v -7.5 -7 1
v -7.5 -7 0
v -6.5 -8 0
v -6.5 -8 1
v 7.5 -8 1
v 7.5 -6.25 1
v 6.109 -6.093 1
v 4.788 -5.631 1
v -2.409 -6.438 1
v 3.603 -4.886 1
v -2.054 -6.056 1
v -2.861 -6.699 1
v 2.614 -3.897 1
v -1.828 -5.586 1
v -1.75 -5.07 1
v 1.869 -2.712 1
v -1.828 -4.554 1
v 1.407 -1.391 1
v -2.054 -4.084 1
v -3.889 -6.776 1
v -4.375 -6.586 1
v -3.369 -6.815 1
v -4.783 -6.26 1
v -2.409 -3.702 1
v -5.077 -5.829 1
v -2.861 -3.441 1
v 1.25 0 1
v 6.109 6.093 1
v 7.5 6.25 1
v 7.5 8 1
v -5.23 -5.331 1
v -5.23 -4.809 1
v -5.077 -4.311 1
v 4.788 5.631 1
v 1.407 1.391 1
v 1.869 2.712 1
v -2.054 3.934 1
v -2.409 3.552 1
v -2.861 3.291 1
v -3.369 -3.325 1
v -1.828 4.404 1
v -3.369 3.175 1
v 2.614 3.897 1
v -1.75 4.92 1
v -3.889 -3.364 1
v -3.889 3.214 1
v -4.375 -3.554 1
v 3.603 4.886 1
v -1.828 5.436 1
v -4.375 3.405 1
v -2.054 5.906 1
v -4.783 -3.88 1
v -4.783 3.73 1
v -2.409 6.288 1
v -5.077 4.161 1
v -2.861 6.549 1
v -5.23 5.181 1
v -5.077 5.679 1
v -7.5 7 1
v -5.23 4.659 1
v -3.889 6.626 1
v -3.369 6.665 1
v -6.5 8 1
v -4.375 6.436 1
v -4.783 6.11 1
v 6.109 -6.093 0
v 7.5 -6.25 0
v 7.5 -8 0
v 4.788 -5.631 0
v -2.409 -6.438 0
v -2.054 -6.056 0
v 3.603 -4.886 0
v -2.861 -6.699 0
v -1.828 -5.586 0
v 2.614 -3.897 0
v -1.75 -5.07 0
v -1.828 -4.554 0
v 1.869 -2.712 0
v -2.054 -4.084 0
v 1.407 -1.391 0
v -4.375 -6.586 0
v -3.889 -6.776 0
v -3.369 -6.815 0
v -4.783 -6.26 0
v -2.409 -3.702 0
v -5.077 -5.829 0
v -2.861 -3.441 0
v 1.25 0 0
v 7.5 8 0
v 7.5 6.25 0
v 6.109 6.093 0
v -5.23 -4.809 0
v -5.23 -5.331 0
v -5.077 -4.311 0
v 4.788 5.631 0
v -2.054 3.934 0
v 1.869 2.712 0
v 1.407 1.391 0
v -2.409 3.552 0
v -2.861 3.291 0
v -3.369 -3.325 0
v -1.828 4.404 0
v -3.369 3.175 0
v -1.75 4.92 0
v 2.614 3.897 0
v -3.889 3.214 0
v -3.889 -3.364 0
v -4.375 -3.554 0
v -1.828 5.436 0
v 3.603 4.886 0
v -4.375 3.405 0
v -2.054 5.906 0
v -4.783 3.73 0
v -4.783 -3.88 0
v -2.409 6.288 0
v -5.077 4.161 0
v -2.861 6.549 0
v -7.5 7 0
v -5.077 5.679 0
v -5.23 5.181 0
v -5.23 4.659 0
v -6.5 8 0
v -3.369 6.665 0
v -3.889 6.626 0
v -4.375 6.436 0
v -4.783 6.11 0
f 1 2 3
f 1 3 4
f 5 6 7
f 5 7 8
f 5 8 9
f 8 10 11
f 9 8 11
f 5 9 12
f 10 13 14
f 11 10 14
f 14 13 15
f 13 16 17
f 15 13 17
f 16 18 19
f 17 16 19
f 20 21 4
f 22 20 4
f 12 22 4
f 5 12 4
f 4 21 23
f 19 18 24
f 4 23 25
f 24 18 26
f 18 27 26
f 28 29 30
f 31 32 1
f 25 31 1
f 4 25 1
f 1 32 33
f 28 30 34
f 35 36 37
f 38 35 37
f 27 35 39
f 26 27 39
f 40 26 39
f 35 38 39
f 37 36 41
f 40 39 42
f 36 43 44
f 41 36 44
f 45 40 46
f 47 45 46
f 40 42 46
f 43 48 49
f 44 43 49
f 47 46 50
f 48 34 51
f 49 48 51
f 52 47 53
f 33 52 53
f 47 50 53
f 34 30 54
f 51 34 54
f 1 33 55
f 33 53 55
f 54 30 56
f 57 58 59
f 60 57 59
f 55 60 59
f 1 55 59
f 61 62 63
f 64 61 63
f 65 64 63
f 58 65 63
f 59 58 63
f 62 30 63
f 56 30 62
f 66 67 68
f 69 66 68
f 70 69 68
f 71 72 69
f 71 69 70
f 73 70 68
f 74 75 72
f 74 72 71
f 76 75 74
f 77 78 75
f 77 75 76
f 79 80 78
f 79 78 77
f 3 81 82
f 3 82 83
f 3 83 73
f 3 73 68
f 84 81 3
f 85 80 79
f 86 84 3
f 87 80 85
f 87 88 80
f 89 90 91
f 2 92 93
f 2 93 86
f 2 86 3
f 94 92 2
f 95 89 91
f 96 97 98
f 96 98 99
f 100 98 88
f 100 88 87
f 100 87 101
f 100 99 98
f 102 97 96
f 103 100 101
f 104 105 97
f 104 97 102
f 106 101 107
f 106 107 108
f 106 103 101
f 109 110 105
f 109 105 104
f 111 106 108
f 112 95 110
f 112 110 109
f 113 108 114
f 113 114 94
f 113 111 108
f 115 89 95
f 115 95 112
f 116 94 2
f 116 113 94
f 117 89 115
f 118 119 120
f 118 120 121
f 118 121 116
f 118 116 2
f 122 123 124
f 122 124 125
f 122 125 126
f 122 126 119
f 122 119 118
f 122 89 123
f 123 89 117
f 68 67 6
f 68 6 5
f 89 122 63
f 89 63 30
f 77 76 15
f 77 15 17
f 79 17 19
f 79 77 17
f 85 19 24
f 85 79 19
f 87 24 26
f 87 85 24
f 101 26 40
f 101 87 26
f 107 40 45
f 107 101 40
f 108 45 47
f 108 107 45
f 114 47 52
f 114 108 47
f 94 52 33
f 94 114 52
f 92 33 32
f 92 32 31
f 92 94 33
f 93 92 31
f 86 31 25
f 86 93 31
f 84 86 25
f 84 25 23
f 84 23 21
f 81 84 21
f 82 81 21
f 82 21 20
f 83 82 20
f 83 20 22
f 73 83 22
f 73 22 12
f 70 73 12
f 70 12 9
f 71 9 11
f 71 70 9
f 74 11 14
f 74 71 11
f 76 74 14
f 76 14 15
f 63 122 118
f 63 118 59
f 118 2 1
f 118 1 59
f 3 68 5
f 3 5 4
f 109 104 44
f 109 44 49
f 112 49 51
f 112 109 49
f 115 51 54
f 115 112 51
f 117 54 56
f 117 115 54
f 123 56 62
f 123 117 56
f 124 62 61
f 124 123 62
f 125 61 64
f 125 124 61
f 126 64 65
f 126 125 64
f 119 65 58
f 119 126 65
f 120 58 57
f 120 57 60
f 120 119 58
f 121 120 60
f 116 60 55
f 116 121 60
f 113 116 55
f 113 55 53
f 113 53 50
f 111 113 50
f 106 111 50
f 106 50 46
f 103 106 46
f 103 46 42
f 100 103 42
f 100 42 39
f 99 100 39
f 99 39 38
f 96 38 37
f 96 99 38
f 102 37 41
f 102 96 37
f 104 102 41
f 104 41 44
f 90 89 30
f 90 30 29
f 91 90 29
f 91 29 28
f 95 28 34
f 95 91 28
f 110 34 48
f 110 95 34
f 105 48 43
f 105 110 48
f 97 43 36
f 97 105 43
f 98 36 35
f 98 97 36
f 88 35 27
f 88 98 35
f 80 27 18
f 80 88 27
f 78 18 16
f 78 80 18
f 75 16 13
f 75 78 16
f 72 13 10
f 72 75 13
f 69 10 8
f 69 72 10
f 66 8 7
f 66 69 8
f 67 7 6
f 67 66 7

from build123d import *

# Parameters (mm, degrees)
SKETCH1_R           = 1.75
BOSS_EXTRUDE1_DEPTH = 1
CHAMFER1_SIZE       = 1


with BuildPart() as part:
    # Sketch1 → Boss-Extrude1 (new body)
    with BuildSketch(Plane.XY):
        with BuildLine():
            Line((7.5, -6.25), (7.5, -8))
            Line((7.5, -8), (-7.5, -8))
            Line((-7.5, -8), (-7.5, 8))
            Line((-7.5, 8), (7.5, 8))
            Line((7.5, 8), (7.5, 6.25))
            ThreePointArc((7.5, 6.25), (1.25, 0), (7.5, -6.25))
        make_face()
        with Locations((-3.5, 4.920147805)):
            Circle(SKETCH1_R, mode=Mode.SUBTRACT)
        with Locations((-3.5, -5.069977671)):
            Circle(SKETCH1_R, mode=Mode.SUBTRACT)
    extrude(amount=BOSS_EXTRUDE1_DEPTH)

    # Chamfer1
    chamfer1_edges = [part.edges().sort_by_distance(p)[0] for p in [
        (-7.5, -8, 0.5),
        (-7.5, 8, 0.5),
    ]]
    chamfer(chamfer1_edges, length=CHAMFER1_SIZE)


solid = part.part
